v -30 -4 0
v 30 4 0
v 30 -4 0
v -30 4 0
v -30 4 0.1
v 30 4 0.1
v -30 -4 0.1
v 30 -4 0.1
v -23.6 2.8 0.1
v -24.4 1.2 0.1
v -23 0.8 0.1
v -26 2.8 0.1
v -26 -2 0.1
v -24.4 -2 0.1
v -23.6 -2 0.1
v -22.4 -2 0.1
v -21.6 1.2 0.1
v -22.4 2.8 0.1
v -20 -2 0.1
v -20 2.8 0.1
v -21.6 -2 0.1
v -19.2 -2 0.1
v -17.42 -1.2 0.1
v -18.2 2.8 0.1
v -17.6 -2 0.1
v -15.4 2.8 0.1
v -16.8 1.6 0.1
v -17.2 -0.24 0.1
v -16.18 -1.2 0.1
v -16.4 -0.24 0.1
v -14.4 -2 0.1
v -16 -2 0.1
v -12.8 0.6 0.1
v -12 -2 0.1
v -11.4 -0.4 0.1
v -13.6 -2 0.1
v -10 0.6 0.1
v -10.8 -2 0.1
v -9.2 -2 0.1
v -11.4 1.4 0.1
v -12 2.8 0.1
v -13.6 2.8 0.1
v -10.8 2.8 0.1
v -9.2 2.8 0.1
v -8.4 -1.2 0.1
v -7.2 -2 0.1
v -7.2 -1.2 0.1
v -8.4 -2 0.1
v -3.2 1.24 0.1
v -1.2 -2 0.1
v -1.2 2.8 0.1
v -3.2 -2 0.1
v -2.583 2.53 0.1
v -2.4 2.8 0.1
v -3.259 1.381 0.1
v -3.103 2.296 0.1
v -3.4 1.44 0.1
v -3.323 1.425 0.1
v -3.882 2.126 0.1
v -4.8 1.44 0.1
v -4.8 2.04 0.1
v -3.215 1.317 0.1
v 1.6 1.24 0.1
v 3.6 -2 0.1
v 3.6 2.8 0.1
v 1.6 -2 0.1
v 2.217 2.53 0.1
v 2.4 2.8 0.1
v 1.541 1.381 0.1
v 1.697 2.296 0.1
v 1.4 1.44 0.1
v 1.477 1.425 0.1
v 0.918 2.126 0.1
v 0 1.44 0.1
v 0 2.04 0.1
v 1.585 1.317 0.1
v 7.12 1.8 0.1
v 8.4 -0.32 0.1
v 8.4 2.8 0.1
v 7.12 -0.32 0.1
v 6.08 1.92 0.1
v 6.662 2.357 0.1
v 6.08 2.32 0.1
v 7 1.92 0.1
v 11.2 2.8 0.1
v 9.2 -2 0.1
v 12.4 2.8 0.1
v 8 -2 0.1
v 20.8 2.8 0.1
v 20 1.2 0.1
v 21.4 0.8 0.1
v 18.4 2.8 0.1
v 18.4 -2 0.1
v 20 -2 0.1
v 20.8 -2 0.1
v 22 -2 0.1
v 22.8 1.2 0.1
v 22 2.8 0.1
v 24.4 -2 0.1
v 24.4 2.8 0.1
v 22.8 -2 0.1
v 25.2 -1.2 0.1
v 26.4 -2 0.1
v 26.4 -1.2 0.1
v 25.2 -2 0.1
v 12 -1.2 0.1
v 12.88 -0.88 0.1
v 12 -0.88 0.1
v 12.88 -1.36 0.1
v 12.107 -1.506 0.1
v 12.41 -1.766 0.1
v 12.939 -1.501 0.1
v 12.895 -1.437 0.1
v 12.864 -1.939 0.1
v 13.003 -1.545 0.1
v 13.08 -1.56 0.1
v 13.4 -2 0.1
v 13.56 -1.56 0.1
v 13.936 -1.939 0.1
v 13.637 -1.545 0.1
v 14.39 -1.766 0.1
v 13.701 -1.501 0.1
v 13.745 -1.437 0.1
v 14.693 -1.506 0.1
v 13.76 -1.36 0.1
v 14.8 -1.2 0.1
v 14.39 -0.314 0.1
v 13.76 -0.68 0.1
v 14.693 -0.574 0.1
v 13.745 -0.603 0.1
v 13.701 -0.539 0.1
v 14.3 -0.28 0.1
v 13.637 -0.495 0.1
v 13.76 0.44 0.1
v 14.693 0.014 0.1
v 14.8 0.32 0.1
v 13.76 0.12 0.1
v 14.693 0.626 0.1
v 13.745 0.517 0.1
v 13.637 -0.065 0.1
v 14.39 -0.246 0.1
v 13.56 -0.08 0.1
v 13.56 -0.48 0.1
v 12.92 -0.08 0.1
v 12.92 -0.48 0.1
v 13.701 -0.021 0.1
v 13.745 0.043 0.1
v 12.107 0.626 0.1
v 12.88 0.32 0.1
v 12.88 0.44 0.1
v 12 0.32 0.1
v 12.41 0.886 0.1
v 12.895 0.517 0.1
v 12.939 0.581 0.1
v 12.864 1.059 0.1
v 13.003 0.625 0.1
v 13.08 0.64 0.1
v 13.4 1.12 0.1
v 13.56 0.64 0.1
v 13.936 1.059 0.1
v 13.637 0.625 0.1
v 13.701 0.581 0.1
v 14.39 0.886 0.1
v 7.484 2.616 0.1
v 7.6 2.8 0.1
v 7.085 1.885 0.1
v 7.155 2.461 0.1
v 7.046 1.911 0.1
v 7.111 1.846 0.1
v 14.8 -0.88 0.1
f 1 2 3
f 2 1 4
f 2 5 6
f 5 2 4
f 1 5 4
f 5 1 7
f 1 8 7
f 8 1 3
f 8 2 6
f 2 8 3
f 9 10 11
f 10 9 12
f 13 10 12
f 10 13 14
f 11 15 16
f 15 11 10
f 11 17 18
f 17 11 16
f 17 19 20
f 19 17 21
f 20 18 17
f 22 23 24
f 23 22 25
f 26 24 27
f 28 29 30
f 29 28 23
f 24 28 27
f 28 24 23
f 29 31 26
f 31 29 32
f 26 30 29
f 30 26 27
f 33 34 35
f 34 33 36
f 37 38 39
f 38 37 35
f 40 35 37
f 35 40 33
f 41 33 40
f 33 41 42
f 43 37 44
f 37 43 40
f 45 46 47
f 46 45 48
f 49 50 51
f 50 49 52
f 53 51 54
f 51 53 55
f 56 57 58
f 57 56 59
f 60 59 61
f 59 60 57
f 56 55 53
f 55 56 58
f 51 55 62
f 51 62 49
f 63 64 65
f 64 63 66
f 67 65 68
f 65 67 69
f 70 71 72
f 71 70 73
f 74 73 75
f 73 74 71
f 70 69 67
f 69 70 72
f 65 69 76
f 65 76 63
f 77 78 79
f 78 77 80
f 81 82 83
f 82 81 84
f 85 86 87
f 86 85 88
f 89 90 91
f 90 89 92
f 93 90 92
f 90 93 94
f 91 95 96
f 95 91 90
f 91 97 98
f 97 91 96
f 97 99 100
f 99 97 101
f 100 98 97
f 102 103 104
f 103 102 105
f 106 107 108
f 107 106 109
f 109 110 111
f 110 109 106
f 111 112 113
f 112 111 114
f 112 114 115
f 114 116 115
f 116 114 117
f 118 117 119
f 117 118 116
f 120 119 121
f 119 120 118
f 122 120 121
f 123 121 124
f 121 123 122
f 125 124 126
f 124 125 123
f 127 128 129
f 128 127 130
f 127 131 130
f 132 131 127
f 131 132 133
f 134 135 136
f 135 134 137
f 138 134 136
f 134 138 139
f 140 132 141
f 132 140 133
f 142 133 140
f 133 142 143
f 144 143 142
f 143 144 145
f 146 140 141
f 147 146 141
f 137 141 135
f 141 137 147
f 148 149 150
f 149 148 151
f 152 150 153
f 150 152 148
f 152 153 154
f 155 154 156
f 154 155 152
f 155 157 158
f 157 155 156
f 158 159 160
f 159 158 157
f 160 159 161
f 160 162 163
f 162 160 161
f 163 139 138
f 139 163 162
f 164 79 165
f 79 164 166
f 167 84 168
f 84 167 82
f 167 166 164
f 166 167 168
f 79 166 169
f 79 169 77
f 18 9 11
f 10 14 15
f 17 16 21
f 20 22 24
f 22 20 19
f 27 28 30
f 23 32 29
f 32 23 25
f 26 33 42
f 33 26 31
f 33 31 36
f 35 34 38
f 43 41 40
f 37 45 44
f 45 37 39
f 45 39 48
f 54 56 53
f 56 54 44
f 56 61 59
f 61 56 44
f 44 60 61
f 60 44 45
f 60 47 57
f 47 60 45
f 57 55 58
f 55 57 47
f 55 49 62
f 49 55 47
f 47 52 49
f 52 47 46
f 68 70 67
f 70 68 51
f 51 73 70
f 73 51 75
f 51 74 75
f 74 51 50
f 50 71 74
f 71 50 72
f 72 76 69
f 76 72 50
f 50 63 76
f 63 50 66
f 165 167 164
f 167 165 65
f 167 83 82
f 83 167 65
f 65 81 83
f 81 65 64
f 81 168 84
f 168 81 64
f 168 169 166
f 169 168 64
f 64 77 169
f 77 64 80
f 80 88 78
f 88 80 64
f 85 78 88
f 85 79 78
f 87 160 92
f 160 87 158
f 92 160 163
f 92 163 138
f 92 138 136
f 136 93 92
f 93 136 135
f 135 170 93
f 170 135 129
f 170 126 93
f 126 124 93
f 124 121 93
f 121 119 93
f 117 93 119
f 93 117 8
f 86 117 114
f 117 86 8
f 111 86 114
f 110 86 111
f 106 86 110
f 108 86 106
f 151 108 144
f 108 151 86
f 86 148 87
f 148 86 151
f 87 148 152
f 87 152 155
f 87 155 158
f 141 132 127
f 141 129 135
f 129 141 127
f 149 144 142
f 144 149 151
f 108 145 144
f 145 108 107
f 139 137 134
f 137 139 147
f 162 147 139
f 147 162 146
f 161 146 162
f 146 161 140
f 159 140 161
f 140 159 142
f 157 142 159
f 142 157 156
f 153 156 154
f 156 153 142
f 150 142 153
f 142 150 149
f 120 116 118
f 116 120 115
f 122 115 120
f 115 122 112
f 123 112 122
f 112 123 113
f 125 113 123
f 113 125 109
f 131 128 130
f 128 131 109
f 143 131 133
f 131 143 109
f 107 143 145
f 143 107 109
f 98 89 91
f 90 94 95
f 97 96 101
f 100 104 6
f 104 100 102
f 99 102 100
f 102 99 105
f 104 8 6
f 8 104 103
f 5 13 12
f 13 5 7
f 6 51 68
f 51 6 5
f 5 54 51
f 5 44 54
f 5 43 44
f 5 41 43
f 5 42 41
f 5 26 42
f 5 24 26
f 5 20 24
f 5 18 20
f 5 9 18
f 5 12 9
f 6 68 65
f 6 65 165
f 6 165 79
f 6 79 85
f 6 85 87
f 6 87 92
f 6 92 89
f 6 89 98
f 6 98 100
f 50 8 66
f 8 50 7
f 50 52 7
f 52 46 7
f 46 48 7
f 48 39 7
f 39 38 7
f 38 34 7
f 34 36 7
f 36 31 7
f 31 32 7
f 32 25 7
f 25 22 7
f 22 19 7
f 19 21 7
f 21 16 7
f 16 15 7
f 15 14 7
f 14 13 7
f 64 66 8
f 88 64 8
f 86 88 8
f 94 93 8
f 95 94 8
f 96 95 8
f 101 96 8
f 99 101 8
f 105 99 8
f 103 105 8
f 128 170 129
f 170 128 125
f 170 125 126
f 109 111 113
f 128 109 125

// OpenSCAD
// file: ../p/box5-12.scad
use <../lib.scad>
function ldraw_lib__box5_12() = [
// 0 Box with 5 Faces without Any Edges
// 0 Name: box5-12.dat
// 0 Author: Chris Dee [cwdee]
// 0 !LDRAW_ORG Primitive UPDATE 2009-02
// 0 !LICENSE Licensed under CC BY 4.0 : see CAreadme.txt
// 
// 0 BFC CERTIFY CCW
  [0,"BFC","CERTIFY"],
  [0,"BFC","CCW"],
// 
// 0 !HISTORY 2009-09-03 [PTadmin] Official Update 2009-02
// 
// 
// 4 16 1 1 1 1 1 -1 -1 1 -1 -1 1 1
  [4,16,1,1,1,1,1,-1,-1,1,-1,-1,1,1],
// 4 16 -1 0 1 1 0 1 1 1 1 -1 1 1
  [4,16,-1,0,1,1,0,1,1,1,1,-1,1,1],
// 4 16 -1 0 -1 -1 0 1 -1 1 1 -1 1 -1
  [4,16,-1,0,-1,-1,0,1,-1,1,1,-1,1,-1],
// 4 16 1 0 -1 -1 0 -1 -1 1 -1 1 1 -1
  [4,16,1,0,-1,-1,0,-1,-1,1,-1,1,1,-1],
// 4 16 1 0 1 1 0 -1 1 1 -1 1 1 1
  [4,16,1,0,1,1,0,-1,1,1,-1,1,1,1],
// 0
];
module ldraw_lib__box5_12(step=0, col=false, unit=2/5, alt=false, line=0.2, solid=!$preview)
    makepoly(ldraw_lib__box5_12(), step=step, col=col, unit=unit, alt=alt, line=line, solid=solid);
ldraw_lib__box5_12(line=0.2);
// main file
use <../lib.scad>
use <../p/box5-12.scad>
function ldraw_lib__4198678a() = [
// 0 Sticker  1.0 x  7.5 with Black "MAX. 11  1/3 M."
// 0 Name: 4198678a.dat
// 0 Author: Tim Lampmann [L4mpi]
// 0 !LDRAW_ORG Part UPDATE 2019-03
// 0 !LICENSE Licensed under CC BY 4.0 : see CAreadme.txt
// 
// 0 BFC CERTIFY CCW
  [0,"BFC","CERTIFY"],
  [0,"BFC","CCW"],
// 
// 0 !KEYWORDS Cargo, container, Crane, Freight yard, Lorry, Set 4514
// 
// 0 !HISTORY 2019-12-27 [PTadmin] Official Update 2019-03
// 
// 
// 1 16 0 -0.25 0 75 0 0 0 0.25 0 0 0 10 box5-12.dat
  [1,16,0,-0.25,0,75,0,0,0,0.25,0,0,0,10, ldraw_lib__box5_12()],
// 4 0 -59 -0.25 7 -65 -0.25 7 -61 -0.25 3 -57.5 -0.25 2
  [4,0,-59,-0.25,7,-65,-0.25,7,-61,-0.25,3,-57.5,-0.25,2],
// 4 0 -61 -0.25 3 -65 -0.25 7 -65 -0.25 -5 -61 -0.25 -5
  [4,0,-61,-0.25,3,-65,-0.25,7,-65,-0.25,-5,-61,-0.25,-5],
// 4 0 -59 -0.25 -5 -56 -0.25 -5 -57.5 -0.25 2 -61 -0.25 3
  [4,0,-59,-0.25,-5,-56,-0.25,-5,-57.5,-0.25,2,-61,-0.25,3],
// 4 0 -54 -0.25 3 -56 -0.25 7 -57.5 -0.25 2 -56 -0.25 -5
  [4,0,-54,-0.25,3,-56,-0.25,7,-57.5,-0.25,2,-56,-0.25,-5],
// 4 0 -54 -0.25 3 -54 -0.25 -5 -50 -0.25 -5 -50 -0.25 7
  [4,0,-54,-0.25,3,-54,-0.25,-5,-50,-0.25,-5,-50,-0.25,7],
// 3 0 -50 -0.25 7 -56 -0.25 7 -54 -0.25 3
  [3,0,-50,-0.25,7,-56,-0.25,7,-54,-0.25,3],
// 4 0 -45.5 -0.25 7 -48 -0.25 -5 -44 -0.25 -5 -43.55 -0.25 -3
  [4,0,-45.5,-0.25,7,-48,-0.25,-5,-44,-0.25,-5,-43.55,-0.25,-3],
// 3 0 -38.5 -0.25 7 -45.5 -0.25 7 -42 -0.25 4
  [3,0,-38.5,-0.25,7,-45.5,-0.25,7,-42,-0.25,4],
// 4 0 -41 -0.25 -0.6 -43 -0.25 -0.6 -43.55 -0.25 -3 -40.45 -0.25 -3
  [4,0,-41,-0.25,-0.6,-43,-0.25,-0.6,-43.55,-0.25,-3,-40.45,-0.25,-3],
// 4 0 -43 -0.25 -0.6 -42 -0.25 4 -45.5 -0.25 7 -43.55 -0.25 -3
  [4,0,-43,-0.25,-0.6,-42,-0.25,4,-45.5,-0.25,7,-43.55,-0.25,-3],
// 4 0 -40 -0.25 -5 -36 -0.25 -5 -38.5 -0.25 7 -40.45 -0.25 -3
  [4,0,-40,-0.25,-5,-36,-0.25,-5,-38.5,-0.25,7,-40.45,-0.25,-3],
// 4 0 -41 -0.25 -0.6 -40.45 -0.25 -3 -38.5 -0.25 7 -42 -0.25 4
  [4,0,-41,-0.25,-0.6,-40.45,-0.25,-3,-38.5,-0.25,7,-42,-0.25,4],
// 4 0 -34 -0.25 -5 -30 -0.25 -5 -28.5 -0.25 -1 -32 -0.25 1.5
  [4,0,-34,-0.25,-5,-30,-0.25,-5,-28.5,-0.25,-1,-32,-0.25,1.5],
// 4 0 -28.5 -0.25 -1 -27 -0.25 -5 -23 -0.25 -5 -25 -0.25 1.5
  [4,0,-28.5,-0.25,-1,-27,-0.25,-5,-23,-0.25,-5,-25,-0.25,1.5],
// 4 0 -32 -0.25 1.5 -28.5 -0.25 -1 -25 -0.25 1.5 -28.5 -0.25 3.5
  [4,0,-32,-0.25,1.5,-28.5,-0.25,-1,-25,-0.25,1.5,-28.5,-0.25,3.5],
// 4 0 -30 -0.25 7 -34 -0.25 7 -32 -0.25 1.5 -28.5 -0.25 3.5
  [4,0,-30,-0.25,7,-34,-0.25,7,-32,-0.25,1.5,-28.5,-0.25,3.5],
// 4 0 -27 -0.25 7 -28.5 -0.25 3.5 -25 -0.25 1.5 -23 -0.25 7
  [4,0,-27,-0.25,7,-28.5,-0.25,3.5,-25,-0.25,1.5,-23,-0.25,7],
// 4 0 -18 -0.25 -3 -21 -0.25 -3 -21 -0.25 -5 -18 -0.25 -5
  [4,0,-18,-0.25,-3,-21,-0.25,-3,-21,-0.25,-5,-18,-0.25,-5],
// 4 0 -8 -0.25 -5 -3 -0.25 -5 -3 -0.25 7 -8 -0.25 3.1
  [4,0,-8,-0.25,-5,-3,-0.25,-5,-3,-0.25,7,-8,-0.25,3.1],
// 4 0 -3 -0.25 7 -6 -0.25 7 -6.45765 -0.25 6.32597 -8.14645 -0.25 3.45355
  [4,0,-3,-0.25,7,-6,-0.25,7,-6.45765,-0.25,6.32597,-8.14645,-0.25,3.45355],
// 4 0 -7.75807 -0.25 5.73934 -9.70428 -0.25 5.31418 -8.5 -0.25 3.6 -8.30866 -0.25 3.56194
  [4,0,-7.75807,-0.25,5.73934,-9.70428,-0.25,5.31418,-8.5,-0.25,3.6,-8.30866,-0.25,3.56194],
// 4 0 -8.5 -0.25 3.6 -9.70428 -0.25 5.31418 -12 -0.25 5.1 -12 -0.25 3.6
  [4,0,-8.5,-0.25,3.6,-9.70428,-0.25,5.31418,-12,-0.25,5.1,-12,-0.25,3.6],
// 4 0 -7.75807 -0.25 5.73934 -8.30866 -0.25 3.56194 -8.14645 -0.25 3.45355 -6.45765 -0.25 6.32597
  [4,0,-7.75807,-0.25,5.73934,-8.30866,-0.25,3.56194,-8.14645,-0.25,3.45355,-6.45765,-0.25,6.32597],
// 3 0 -3 -0.25 7 -8.14645 -0.25 3.45355 -8.03806 -0.25 3.29134
  [3,0,-3,-0.25,7,-8.14645,-0.25,3.45355,-8.03806,-0.25,3.29134],
// 3 0 -3 -0.25 7 -8.03806 -0.25 3.29134 -8 -0.25 3.1
  [3,0,-3,-0.25,7,-8.03806,-0.25,3.29134,-8,-0.25,3.1],
// 4 0 4 -0.25 -5 9 -0.25 -5 9 -0.25 7 4 -0.25 3.1
  [4,0,4,-0.25,-5,9,-0.25,-5,9,-0.25,7,4,-0.25,3.1],
// 4 0 9 -0.25 7 6 -0.25 7 5.54235 -0.25 6.32597 3.85355 -0.25 3.45355
  [4,0,9,-0.25,7,6,-0.25,7,5.54235,-0.25,6.32597,3.85355,-0.25,3.45355],
// 4 0 4.24193 -0.25 5.73934 2.29572 -0.25 5.31418 3.5 -0.25 3.6 3.69134 -0.25 3.56194
  [4,0,4.24193,-0.25,5.73934,2.29572,-0.25,5.31418,3.5,-0.25,3.6,3.69134,-0.25,3.56194],
// 4 0 3.5 -0.25 3.6 2.29572 -0.25 5.31418 0 -0.25 5.1 0 -0.25 3.6
  [4,0,3.5,-0.25,3.6,2.29572,-0.25,5.31418,0,-0.25,5.1,0,-0.25,3.6],
// 4 0 4.24193 -0.25 5.73934 3.69134 -0.25 3.56194 3.85355 -0.25 3.45355 5.54235 -0.25 6.32597
  [4,0,4.24193,-0.25,5.73934,3.69134,-0.25,3.56194,3.85355,-0.25,3.45355,5.54235,-0.25,6.32597],
// 3 0 9 -0.25 7 3.85355 -0.25 3.45355 3.96194 -0.25 3.29134
  [3,0,9,-0.25,7,3.85355,-0.25,3.45355,3.96194,-0.25,3.29134],
// 3 0 9 -0.25 7 3.96194 -0.25 3.29134 4 -0.25 3.1
  [3,0,9,-0.25,7,3.96194,-0.25,3.29134,4,-0.25,3.1],
// 4 0 17.8 -0.25 -0.8 21 -0.25 -0.8 21 -0.25 7 17.8 -0.25 4.5
  [4,0,17.8,-0.25,-0.8,21,-0.25,-0.8,21,-0.25,7,17.8,-0.25,4.5],
// 4 0 15.2 -0.25 5.8 15.2 -0.25 4.8 17.5 -0.25 4.8 16.6542 -0.25 5.89134
  [4,0,15.2,-0.25,5.8,15.2,-0.25,4.8,17.5,-0.25,4.8,16.6542,-0.25,5.89134],
// 4 0 20 -0.25 -5 23 -0.25 -5 31 -0.25 7 28 -0.25 7
  [4,0,20,-0.25,-5,23,-0.25,-5,31,-0.25,7,28,-0.25,7],
// 4 0 52 -0.25 7 46 -0.25 7 50 -0.25 3 53.5 -0.25 2
  [4,0,52,-0.25,7,46,-0.25,7,50,-0.25,3,53.5,-0.25,2],
// 4 0 50 -0.25 3 46 -0.25 7 46 -0.25 -5 50 -0.25 -5
  [4,0,50,-0.25,3,46,-0.25,7,46,-0.25,-5,50,-0.25,-5],
// 4 0 52 -0.25 -5 55 -0.25 -5 53.5 -0.25 2 50 -0.25 3
  [4,0,52,-0.25,-5,55,-0.25,-5,53.5,-0.25,2,50,-0.25,3],
// 4 0 57 -0.25 3 55 -0.25 7 53.5 -0.25 2 55 -0.25 -5
  [4,0,57,-0.25,3,55,-0.25,7,53.5,-0.25,2,55,-0.25,-5],
// 4 0 57 -0.25 3 57 -0.25 -5 61 -0.25 -5 61 -0.25 7
  [4,0,57,-0.25,3,57,-0.25,-5,61,-0.25,-5,61,-0.25,7],
// 3 0 61 -0.25 7 55 -0.25 7 57 -0.25 3
  [3,0,61,-0.25,7,55,-0.25,7,57,-0.25,3],
// 4 0 66 -0.25 -3 63 -0.25 -3 63 -0.25 -5 66 -0.25 -5
  [4,0,66,-0.25,-3,63,-0.25,-3,63,-0.25,-5,66,-0.25,-5],
// 4 0 32.2 -0.25 -2.2 30 -0.25 -2.2 30 -0.25 -3 32.2 -0.25 -3.4
  [4,0,32.2,-0.25,-2.2,30,-0.25,-2.2,30,-0.25,-3,32.2,-0.25,-3.4],
// 4 0 32.2 -0.25 -3.4 30 -0.25 -3 30.26642 -0.25 -3.76537 31.02513 -0.25 -4.41421
  [4,0,32.2,-0.25,-3.4,30,-0.25,-3,30.26642,-0.25,-3.76537,31.02513,-0.25,-4.41421],
// 4 0 32.23806 -0.25 -3.59134 31.02513 -0.25 -4.41421 32.16061 -0.25 -4.84776 32.34645 -0.25 -3.75355
  [4,0,32.23806,-0.25,-3.59134,31.02513,-0.25,-4.41421,32.16061,-0.25,-4.84776,32.34645,-0.25,-3.75355],
// 3 0 32.34645 -0.25 -3.75355 32.16061 -0.25 -4.84776 32.50866 -0.25 -3.86194
  [3,0,32.34645,-0.25,-3.75355,32.16061,-0.25,-4.84776,32.50866,-0.25,-3.86194],
// 4 0 32.7 -0.25 -3.9 32.50866 -0.25 -3.86194 32.16061 -0.25 -4.84776 33.5 -0.25 -5
  [4,0,32.7,-0.25,-3.9,32.50866,-0.25,-3.86194,32.16061,-0.25,-4.84776,33.5,-0.25,-5],
// 4 0 33.9 -0.25 -3.9 32.7 -0.25 -3.9 33.5 -0.25 -5 34.83939 -0.25 -4.84776
  [4,0,33.9,-0.25,-3.9,32.7,-0.25,-3.9,33.5,-0.25,-5,34.83939,-0.25,-4.84776],
// 4 0 34.09134 -0.25 -3.86194 33.9 -0.25 -3.9 34.83939 -0.25 -4.84776 35.97487 -0.25 -4.41421
  [4,0,34.09134,-0.25,-3.86194,33.9,-0.25,-3.9,34.83939,-0.25,-4.84776,35.97487,-0.25,-4.41421],
// 3 0 34.25355 -0.25 -3.75355 34.09134 -0.25 -3.86194 35.97487 -0.25 -4.41421
  [3,0,34.25355,-0.25,-3.75355,34.09134,-0.25,-3.86194,35.97487,-0.25,-4.41421],
// 4 0 34.36194 -0.25 -3.59134 34.25355 -0.25 -3.75355 35.97487 -0.25 -4.41421 36.73358 -0.25 -3.76537
  [4,0,34.36194,-0.25,-3.59134,34.25355,-0.25,-3.75355,35.97487,-0.25,-4.41421,36.73358,-0.25,-3.76537],
// 4 0 34.4 -0.25 -3.4 34.36194 -0.25 -3.59134 36.73358 -0.25 -3.76537 37 -0.25 -3
  [4,0,34.4,-0.25,-3.4,34.36194,-0.25,-3.59134,36.73358,-0.25,-3.76537,37,-0.25,-3],
// 4 0 34.4 -0.25 -1.7 36.73358 -0.25 -1.43463 35.97487 -0.25 -0.78579 34.36194 -0.25 -1.50866
  [4,0,34.4,-0.25,-1.7,36.73358,-0.25,-1.43463,35.97487,-0.25,-0.78579,34.36194,-0.25,-1.50866],
// 3 0 35.97487 -0.25 -0.78579 34.25355 -0.25 -1.34645 34.36194 -0.25 -1.50866
  [3,0,35.97487,-0.25,-0.78579,34.25355,-0.25,-1.34645,34.36194,-0.25,-1.50866],
// 4 0 34.09134 -0.25 -1.23806 34.25355 -0.25 -1.34645 35.97487 -0.25 -0.78579 35.75 -0.25 -0.7
  [4,0,34.09134,-0.25,-1.23806,34.25355,-0.25,-1.34645,35.97487,-0.25,-0.78579,35.75,-0.25,-0.7],
// 4 0 34.4 -0.25 0.3 36.73358 -0.25 0.03463 37 -0.25 0.8 34.4 -0.25 1.1
  [4,0,34.4,-0.25,0.3,36.73358,-0.25,0.03463,37,-0.25,0.8,34.4,-0.25,1.1],
// 4 0 34.4 -0.25 1.1 37 -0.25 0.8 36.73358 -0.25 1.56537 34.36194 -0.25 1.29134
  [4,0,34.4,-0.25,1.1,37,-0.25,0.8,36.73358,-0.25,1.56537,34.36194,-0.25,1.29134],
// 4 0 35.75 -0.25 -0.7 35.97487 -0.25 -0.61421 34.09134 -0.25 -0.16194 34.09134 -0.25 -1.23806
  [4,0,35.75,-0.25,-0.7,35.97487,-0.25,-0.61421,34.09134,-0.25,-0.16194,34.09134,-0.25,-1.23806],
// 4 0 33.9 -0.25 -1.2 34.09134 -0.25 -1.23806 34.09134 -0.25 -0.16194 33.9 -0.25 -0.2
  [4,0,33.9,-0.25,-1.2,34.09134,-0.25,-1.23806,34.09134,-0.25,-0.16194,33.9,-0.25,-0.2],
// 4 0 32.3 -0.25 -1.2 33.9 -0.25 -1.2 33.9 -0.25 -0.2 32.3 -0.25 -0.2
  [4,0,32.3,-0.25,-1.2,33.9,-0.25,-1.2,33.9,-0.25,-0.2,32.3,-0.25,-0.2],
// 3 0 34.25355 -0.25 -0.05355 34.09134 -0.25 -0.16194 35.97487 -0.25 -0.61421
  [3,0,34.25355,-0.25,-0.05355,34.09134,-0.25,-0.16194,35.97487,-0.25,-0.61421],
// 3 0 34.36194 -0.25 0.10866 34.25355 -0.25 -0.05355 35.97487 -0.25 -0.61421
  [3,0,34.36194,-0.25,0.10866,34.25355,-0.25,-0.05355,35.97487,-0.25,-0.61421],
// 4 0 34.4 -0.25 0.3 34.36194 -0.25 0.10866 35.97487 -0.25 -0.61421 36.73358 -0.25 0.03463
  [4,0,34.4,-0.25,0.3,34.36194,-0.25,0.10866,35.97487,-0.25,-0.61421,36.73358,-0.25,0.03463],
// 4 0 30 -0.25 0.8 32.2 -0.25 0.8 32.2 -0.25 1.1 30.26642 -0.25 1.56537
  [4,0,30,-0.25,0.8,32.2,-0.25,0.8,32.2,-0.25,1.1,30.26642,-0.25,1.56537],
// 4 0 30.26642 -0.25 1.56537 32.2 -0.25 1.1 32.23806 -0.25 1.29134 31.02513 -0.25 2.21421
  [4,0,30.26642,-0.25,1.56537,32.2,-0.25,1.1,32.23806,-0.25,1.29134,31.02513,-0.25,2.21421],
// 3 0 31.02513 -0.25 2.21421 32.23806 -0.25 1.29134 32.34645 -0.25 1.45355
  [3,0,31.02513,-0.25,2.21421,32.23806,-0.25,1.29134,32.34645,-0.25,1.45355],
// 4 0 31.02513 -0.25 2.21421 32.34645 -0.25 1.45355 32.50866 -0.25 1.56194 32.16061 -0.25 2.64776
  [4,0,31.02513,-0.25,2.21421,32.34645,-0.25,1.45355,32.50866,-0.25,1.56194,32.16061,-0.25,2.64776],
// 4 0 32.16061 -0.25 2.64776 32.50866 -0.25 1.56194 32.7 -0.25 1.6 33.5 -0.25 2.8
  [4,0,32.16061,-0.25,2.64776,32.50866,-0.25,1.56194,32.7,-0.25,1.6,33.5,-0.25,2.8],
// 4 0 33.5 -0.25 2.8 32.7 -0.25 1.6 33.9 -0.25 1.6 34.83939 -0.25 2.64776
  [4,0,33.5,-0.25,2.8,32.7,-0.25,1.6,33.9,-0.25,1.6,34.83939,-0.25,2.64776],
// 3 0 34.83939 -0.25 2.64776 33.9 -0.25 1.6 34.09134 -0.25 1.56194
  [3,0,34.83939,-0.25,2.64776,33.9,-0.25,1.6,34.09134,-0.25,1.56194],
// 4 0 34.83939 -0.25 2.64776 34.09134 -0.25 1.56194 34.25355 -0.25 1.45355 35.97487 -0.25 2.21421
  [4,0,34.83939,-0.25,2.64776,34.09134,-0.25,1.56194,34.25355,-0.25,1.45355,35.97487,-0.25,2.21421],
// 4 0 35.97487 -0.25 2.21421 34.25355 -0.25 1.45355 34.36194 -0.25 1.29134 36.73358 -0.25 1.56537
  [4,0,35.97487,-0.25,2.21421,34.25355,-0.25,1.45355,34.36194,-0.25,1.29134,36.73358,-0.25,1.56537],
// 4 0 21 -0.25 7 19 -0.25 7 18.71074 -0.25 6.54078 17.71213 -0.25 4.71213
  [4,0,21,-0.25,7,19,-0.25,7,18.71074,-0.25,6.54078,17.71213,-0.25,4.71213],
// 4 0 17.88701 -0.25 6.15147 16.6542 -0.25 5.89134 17.5 -0.25 4.8 17.61481 -0.25 4.77716
  [4,0,17.88701,-0.25,6.15147,16.6542,-0.25,5.89134,17.5,-0.25,4.8,17.61481,-0.25,4.77716],
// 4 0 17.88701 -0.25 6.15147 17.61481 -0.25 4.77716 17.71213 -0.25 4.71213 18.71074 -0.25 6.54078
  [4,0,17.88701,-0.25,6.15147,17.61481,-0.25,4.77716,17.71213,-0.25,4.71213,18.71074,-0.25,6.54078],
// 3 0 21 -0.25 7 17.71213 -0.25 4.71213 17.77716 -0.25 4.61481
  [3,0,21,-0.25,7,17.71213,-0.25,4.71213,17.77716,-0.25,4.61481],
// 3 0 21 -0.25 7 17.77716 -0.25 4.61481 17.8 -0.25 4.5
  [3,0,21,-0.25,7,17.77716,-0.25,4.61481,17.8,-0.25,4.5],
// 3 16 -56 -0.25 7 -59 -0.25 7 -57.5 -0.25 2
  [3,16,-56,-0.25,7,-59,-0.25,7,-57.5,-0.25,2],
// 3 16 -61 -0.25 3 -61 -0.25 -5 -59 -0.25 -5
  [3,16,-61,-0.25,3,-61,-0.25,-5,-59,-0.25,-5],
// 3 16 -54 -0.25 3 -56 -0.25 -5 -54 -0.25 -5
  [3,16,-54,-0.25,3,-56,-0.25,-5,-54,-0.25,-5],
// 4 16 -50 -0.25 7 -50 -0.25 -5 -48 -0.25 -5 -45.5 -0.25 7
  [4,16,-50,-0.25,7,-50,-0.25,-5,-48,-0.25,-5,-45.5,-0.25,7],
// 3 16 -42 -0.25 4 -43 -0.25 -0.6 -41 -0.25 -0.6
  [3,16,-42,-0.25,4,-43,-0.25,-0.6,-41,-0.25,-0.6],
// 4 16 -43.55 -0.25 -3 -44 -0.25 -5 -40 -0.25 -5 -40.45 -0.25 -3
  [4,16,-43.55,-0.25,-3,-44,-0.25,-5,-40,-0.25,-5,-40.45,-0.25,-3],
// 4 16 -32 -0.25 1.5 -34 -0.25 7 -38.5 -0.25 7 -36 -0.25 -5
  [4,16,-32,-0.25,1.5,-34,-0.25,7,-38.5,-0.25,7,-36,-0.25,-5],
// 3 16 -32 -0.25 1.5 -36 -0.25 -5 -34 -0.25 -5
  [3,16,-32,-0.25,1.5,-36,-0.25,-5,-34,-0.25,-5],
// 3 16 -28.5 -0.25 -1 -30 -0.25 -5 -27 -0.25 -5
  [3,16,-28.5,-0.25,-1,-30,-0.25,-5,-27,-0.25,-5],
// 3 16 -27 -0.25 7 -30 -0.25 7 -28.5 -0.25 3.5
  [3,16,-27,-0.25,7,-30,-0.25,7,-28.5,-0.25,3.5],
// 4 16 -21 -0.25 -3 -23 -0.25 7 -25 -0.25 1.5 -23 -0.25 -5
  [4,16,-21,-0.25,-3,-23,-0.25,7,-25,-0.25,1.5,-23,-0.25,-5],
// 3 16 -21 -0.25 -3 -23 -0.25 -5 -21 -0.25 -5
  [3,16,-21,-0.25,-3,-23,-0.25,-5,-21,-0.25,-5],
// 4 16 -6.45765 -0.25 6.32597 -6 -0.25 7 -23 -0.25 7 -7.75807 -0.25 5.73934
  [4,16,-6.45765,-0.25,6.32597,-6,-0.25,7,-23,-0.25,7,-7.75807,-0.25,5.73934],
// 4 16 -9.70428 -0.25 5.31418 -7.75807 -0.25 5.73934 -23 -0.25 7 -12 -0.25 5.1
  [4,16,-9.70428,-0.25,5.31418,-7.75807,-0.25,5.73934,-23,-0.25,7,-12,-0.25,5.1],
// 4 16 -12 -0.25 3.6 -12 -0.25 5.1 -23 -0.25 7 -21 -0.25 -3
  [4,16,-12,-0.25,3.6,-12,-0.25,5.1,-23,-0.25,7,-21,-0.25,-3],
// 4 16 -12 -0.25 3.6 -21 -0.25 -3 -18 -0.25 -3 -8.5 -0.25 3.6
  [4,16,-12,-0.25,3.6,-21,-0.25,-3,-18,-0.25,-3,-8.5,-0.25,3.6],
// 4 16 -8.30866 -0.25 3.56194 -8.5 -0.25 3.6 -18 -0.25 -3 -8.14645 -0.25 3.45355
  [4,16,-8.30866,-0.25,3.56194,-8.5,-0.25,3.6,-18,-0.25,-3,-8.14645,-0.25,3.45355],
// 4 16 -8.03806 -0.25 3.29134 -8.14645 -0.25 3.45355 -18 -0.25 -3 -8 -0.25 3.1
  [4,16,-8.03806,-0.25,3.29134,-8.14645,-0.25,3.45355,-18,-0.25,-3,-8,-0.25,3.1],
// 4 16 -8 -0.25 -5 -8 -0.25 3.1 -18 -0.25 -3 -18 -0.25 -5
  [4,16,-8,-0.25,-5,-8,-0.25,3.1,-18,-0.25,-3,-18,-0.25,-5],
// 4 16 5.54235 -0.25 6.32597 6 -0.25 7 -3 -0.25 7 4.24193 -0.25 5.73934
  [4,16,5.54235,-0.25,6.32597,6,-0.25,7,-3,-0.25,7,4.24193,-0.25,5.73934],
// 4 16 2.29572 -0.25 5.31418 4.24193 -0.25 5.73934 -3 -0.25 7 0 -0.25 5.1
  [4,16,2.29572,-0.25,5.31418,4.24193,-0.25,5.73934,-3,-0.25,7,0,-0.25,5.1],
// 4 16 0 -0.25 3.6 0 -0.25 5.1 -3 -0.25 7 -3 -0.25 -5
  [4,16,0,-0.25,3.6,0,-0.25,5.1,-3,-0.25,7,-3,-0.25,-5],
// 4 16 3.5 -0.25 3.6 0 -0.25 3.6 -3 -0.25 -5 3.69134 -0.25 3.56194
  [4,16,3.5,-0.25,3.6,0,-0.25,3.6,-3,-0.25,-5,3.69134,-0.25,3.56194],
// 4 16 3.85355 -0.25 3.45355 3.69134 -0.25 3.56194 -3 -0.25 -5 3.96194 -0.25 3.29134
  [4,16,3.85355,-0.25,3.45355,3.69134,-0.25,3.56194,-3,-0.25,-5,3.96194,-0.25,3.29134],
// 4 16 4 -0.25 3.1 3.96194 -0.25 3.29134 -3 -0.25 -5 4 -0.25 -5
  [4,16,4,-0.25,3.1,3.96194,-0.25,3.29134,-3,-0.25,-5,4,-0.25,-5],
// 4 16 18.71074 -0.25 6.54078 19 -0.25 7 9 -0.25 7 17.88701 -0.25 6.15147
  [4,16,18.71074,-0.25,6.54078,19,-0.25,7,9,-0.25,7,17.88701,-0.25,6.15147],
// 4 16 16.6542 -0.25 5.89134 17.88701 -0.25 6.15147 9 -0.25 7 15.2 -0.25 5.8
  [4,16,16.6542,-0.25,5.89134,17.88701,-0.25,6.15147,9,-0.25,7,15.2,-0.25,5.8],
// 4 16 15.2 -0.25 4.8 15.2 -0.25 5.8 9 -0.25 7 9 -0.25 -5
  [4,16,15.2,-0.25,4.8,15.2,-0.25,5.8,9,-0.25,7,9,-0.25,-5],
// 4 16 17.5 -0.25 4.8 15.2 -0.25 4.8 9 -0.25 -5 17.61481 -0.25 4.77716
  [4,16,17.5,-0.25,4.8,15.2,-0.25,4.8,9,-0.25,-5,17.61481,-0.25,4.77716],
// 4 16 17.71213 -0.25 4.71213 17.61481 -0.25 4.77716 9 -0.25 -5 17.77716 -0.25 4.61481
  [4,16,17.71213,-0.25,4.71213,17.61481,-0.25,4.77716,9,-0.25,-5,17.77716,-0.25,4.61481],
// 4 16 17.8 -0.25 4.5 17.77716 -0.25 4.61481 9 -0.25 -5 17.8 -0.25 -0.8
  [4,16,17.8,-0.25,4.5,17.77716,-0.25,4.61481,9,-0.25,-5,17.8,-0.25,-0.8],
// 4 16 17.8 -0.25 -0.8 9 -0.25 -5 20 -0.25 -5 21 -0.25 -0.8
  [4,16,17.8,-0.25,-0.8,9,-0.25,-5,20,-0.25,-5,21,-0.25,-0.8],
// 3 16 28 -0.25 7 21 -0.25 -0.8 20 -0.25 -5
  [3,16,28,-0.25,7,21,-0.25,-0.8,20,-0.25,-5],
// 3 16 28 -0.25 7 21 -0.25 7 21 -0.25 -0.8
  [3,16,28,-0.25,7,21,-0.25,7,21,-0.25,-0.8],
// 4 16 31 -0.25 7 33.5 -0.25 2.8 34.83939 -0.25 2.64776 46 -0.25 7
  [4,16,31,-0.25,7,33.5,-0.25,2.8,34.83939,-0.25,2.64776,46,-0.25,7],
// 3 16 46 -0.25 7 34.83939 -0.25 2.64776 35.97487 -0.25 2.21421
  [3,16,46,-0.25,7,34.83939,-0.25,2.64776,35.97487,-0.25,2.21421],
// 3 16 46 -0.25 7 35.97487 -0.25 2.21421 36.73358 -0.25 1.56537
  [3,16,46,-0.25,7,35.97487,-0.25,2.21421,36.73358,-0.25,1.56537],
// 3 16 46 -0.25 7 36.73358 -0.25 1.56537 37 -0.25 0.8
  [3,16,46,-0.25,7,36.73358,-0.25,1.56537,37,-0.25,0.8],
// 4 16 46 -0.25 7 37 -0.25 0.8 36.73358 -0.25 0.03463 46 -0.25 -5
  [4,16,46,-0.25,7,37,-0.25,0.8,36.73358,-0.25,0.03463,46,-0.25,-5],
// 4 16 46 -0.25 -5 36.73358 -0.25 0.03463 36.73358 -0.25 -1.43463 37 -0.25 -2.2
  [4,16,46,-0.25,-5,36.73358,-0.25,0.03463,36.73358,-0.25,-1.43463,37,-0.25,-2.2],
// 3 16 37 -0.25 -2.2 37 -0.25 -3 46 -0.25 -5
  [3,16,37,-0.25,-2.2,37,-0.25,-3,46,-0.25,-5],
// 3 16 37 -0.25 -3 36.73358 -0.25 -3.76537 46 -0.25 -5
  [3,16,37,-0.25,-3,36.73358,-0.25,-3.76537,46,-0.25,-5],
// 3 16 36.73358 -0.25 -3.76537 35.97487 -0.25 -4.41421 46 -0.25 -5
  [3,16,36.73358,-0.25,-3.76537,35.97487,-0.25,-4.41421,46,-0.25,-5],
// 3 16 35.97487 -0.25 -4.41421 34.83939 -0.25 -4.84776 46 -0.25 -5
  [3,16,35.97487,-0.25,-4.41421,34.83939,-0.25,-4.84776,46,-0.25,-5],
// 4 16 46 -0.25 -5 34.83939 -0.25 -4.84776 33.5 -0.25 -5 75 -0.25 -10
  [4,16,46,-0.25,-5,34.83939,-0.25,-4.84776,33.5,-0.25,-5,75,-0.25,-10],
// 4 16 33.5 -0.25 -5 32.16061 -0.25 -4.84776 23 -0.25 -5 75 -0.25 -10
  [4,16,33.5,-0.25,-5,32.16061,-0.25,-4.84776,23,-0.25,-5,75,-0.25,-10],
// 3 16 31.02513 -0.25 -4.41421 23 -0.25 -5 32.16061 -0.25 -4.84776
  [3,16,31.02513,-0.25,-4.41421,23,-0.25,-5,32.16061,-0.25,-4.84776],
// 3 16 30.26642 -0.25 -3.76537 23 -0.25 -5 31.02513 -0.25 -4.41421
  [3,16,30.26642,-0.25,-3.76537,23,-0.25,-5,31.02513,-0.25,-4.41421],
// 3 16 30 -0.25 -3 23 -0.25 -5 30.26642 -0.25 -3.76537
  [3,16,30,-0.25,-3,23,-0.25,-5,30.26642,-0.25,-3.76537],
// 3 16 30 -0.25 -2.2 23 -0.25 -5 30 -0.25 -3
  [3,16,30,-0.25,-2.2,23,-0.25,-5,30,-0.25,-3],
// 4 16 30 -0.25 0.8 23 -0.25 -5 30 -0.25 -2.2 32.3 -0.25 -0.2
  [4,16,30,-0.25,0.8,23,-0.25,-5,30,-0.25,-2.2,32.3,-0.25,-0.2],
// 4 16 31 -0.25 7 23 -0.25 -5 30 -0.25 0.8 30.26642 -0.25 1.56537
  [4,16,31,-0.25,7,23,-0.25,-5,30,-0.25,0.8,30.26642,-0.25,1.56537],
// 3 16 31 -0.25 7 30.26642 -0.25 1.56537 31.02513 -0.25 2.21421
  [3,16,31,-0.25,7,30.26642,-0.25,1.56537,31.02513,-0.25,2.21421],
// 3 16 31 -0.25 7 31.02513 -0.25 2.21421 32.16061 -0.25 2.64776
  [3,16,31,-0.25,7,31.02513,-0.25,2.21421,32.16061,-0.25,2.64776],
// 3 16 31 -0.25 7 32.16061 -0.25 2.64776 33.5 -0.25 2.8
  [3,16,31,-0.25,7,32.16061,-0.25,2.64776,33.5,-0.25,2.8],
// 3 16 35.97487 -0.25 -0.61421 35.75 -0.25 -0.7 35.97487 -0.25 -0.78579
  [3,16,35.97487,-0.25,-0.61421,35.75,-0.25,-0.7,35.97487,-0.25,-0.78579],
// 4 16 36.73358 -0.25 0.03463 35.97487 -0.25 -0.61421 35.97487 -0.25 -0.78579 36.73358 -0.25 -1.43463
  [4,16,36.73358,-0.25,0.03463,35.97487,-0.25,-0.61421,35.97487,-0.25,-0.78579,36.73358,-0.25,-1.43463],
// 4 16 32.2 -0.25 0.8 30 -0.25 0.8 32.3 -0.25 -0.2 33.9 -0.25 -0.2
  [4,16,32.2,-0.25,0.8,30,-0.25,0.8,32.3,-0.25,-0.2,33.9,-0.25,-0.2],
// 4 16 32.3 -0.25 -1.2 32.3 -0.25 -0.2 30 -0.25 -2.2 32.2 -0.25 -2.2
  [4,16,32.3,-0.25,-1.2,32.3,-0.25,-0.2,30,-0.25,-2.2,32.2,-0.25,-2.2],
// 4 16 34.36194 -0.25 0.10866 34.4 -0.25 0.3 34.4 -0.25 1.1 34.36194 -0.25 1.29134
  [4,16,34.36194,-0.25,0.10866,34.4,-0.25,0.3,34.4,-0.25,1.1,34.36194,-0.25,1.29134],
// 4 16 34.25355 -0.25 -0.05355 34.36194 -0.25 0.10866 34.36194 -0.25 1.29134 34.25355 -0.25 1.45355
  [4,16,34.25355,-0.25,-0.05355,34.36194,-0.25,0.10866,34.36194,-0.25,1.29134,34.25355,-0.25,1.45355],
// 4 16 34.09134 -0.25 -0.16194 34.25355 -0.25 -0.05355 34.25355 -0.25 1.45355 34.09134 -0.25 1.56194
  [4,16,34.09134,-0.25,-0.16194,34.25355,-0.25,-0.05355,34.25355,-0.25,1.45355,34.09134,-0.25,1.56194],
// 4 16 33.9 -0.25 -0.2 34.09134 -0.25 -0.16194 34.09134 -0.25 1.56194 33.9 -0.25 1.6
  [4,16,33.9,-0.25,-0.2,34.09134,-0.25,-0.16194,34.09134,-0.25,1.56194,33.9,-0.25,1.6],
// 4 16 33.9 -0.25 -0.2 33.9 -0.25 1.6 32.7 -0.25 1.6 32.50866 -0.25 1.56194
  [4,16,33.9,-0.25,-0.2,33.9,-0.25,1.6,32.7,-0.25,1.6,32.50866,-0.25,1.56194],
// 4 16 33.9 -0.25 -0.2 32.50866 -0.25 1.56194 32.34645 -0.25 1.45355 32.23806 -0.25 1.29134
  [4,16,33.9,-0.25,-0.2,32.50866,-0.25,1.56194,32.34645,-0.25,1.45355,32.23806,-0.25,1.29134],
// 4 16 33.9 -0.25 -0.2 32.23806 -0.25 1.29134 32.2 -0.25 1.1 32.2 -0.25 0.8
  [4,16,33.9,-0.25,-0.2,32.23806,-0.25,1.29134,32.2,-0.25,1.1,32.2,-0.25,0.8],
// 4 16 32.7 -0.25 -3.9 33.9 -0.25 -3.9 34.09134 -0.25 -3.86194 32.50866 -0.25 -3.86194
  [4,16,32.7,-0.25,-3.9,33.9,-0.25,-3.9,34.09134,-0.25,-3.86194,32.50866,-0.25,-3.86194],
// 4 16 32.50866 -0.25 -3.86194 34.09134 -0.25 -3.86194 34.25355 -0.25 -3.75355 32.34645 -0.25 -3.75355
  [4,16,32.50866,-0.25,-3.86194,34.09134,-0.25,-3.86194,34.25355,-0.25,-3.75355,32.34645,-0.25,-3.75355],
// 4 16 32.34645 -0.25 -3.75355 34.25355 -0.25 -3.75355 34.36194 -0.25 -3.59134 32.23806 -0.25 -3.59134
  [4,16,32.34645,-0.25,-3.75355,34.25355,-0.25,-3.75355,34.36194,-0.25,-3.59134,32.23806,-0.25,-3.59134],
// 4 16 32.23806 -0.25 -3.59134 34.36194 -0.25 -3.59134 34.4 -0.25 -3.4 32.2 -0.25 -3.4
  [4,16,32.23806,-0.25,-3.59134,34.36194,-0.25,-3.59134,34.4,-0.25,-3.4,32.2,-0.25,-3.4],
// 4 16 32.2 -0.25 -3.4 34.4 -0.25 -1.7 34.36194 -0.25 -1.50866 34.25355 -0.25 -1.34645
  [4,16,32.2,-0.25,-3.4,34.4,-0.25,-1.7,34.36194,-0.25,-1.50866,34.25355,-0.25,-1.34645],
// 4 16 32.2 -0.25 -3.4 34.25355 -0.25 -1.34645 34.09134 -0.25 -1.23806 33.9 -0.25 -1.2
  [4,16,32.2,-0.25,-3.4,34.25355,-0.25,-1.34645,34.09134,-0.25,-1.23806,33.9,-0.25,-1.2],
// 4 16 32.2 -0.25 -2.2 32.2 -0.25 -3.4 33.9 -0.25 -1.2 32.3 -0.25 -1.2
  [4,16,32.2,-0.25,-2.2,32.2,-0.25,-3.4,33.9,-0.25,-1.2,32.3,-0.25,-1.2],
// 3 16 55 -0.25 7 52 -0.25 7 53.5 -0.25 2
  [3,16,55,-0.25,7,52,-0.25,7,53.5,-0.25,2],
// 3 16 50 -0.25 3 50 -0.25 -5 52 -0.25 -5
  [3,16,50,-0.25,3,50,-0.25,-5,52,-0.25,-5],
// 3 16 57 -0.25 3 55 -0.25 -5 57 -0.25 -5
  [3,16,57,-0.25,3,55,-0.25,-5,57,-0.25,-5],
// 4 16 66 -0.25 -3 75 -0.25 10 61 -0.25 7 63 -0.25 -3
  [4,16,66,-0.25,-3,75,-0.25,10,61,-0.25,7,63,-0.25,-3],
// 4 16 63 -0.25 -3 61 -0.25 7 61 -0.25 -5 63 -0.25 -5
  [4,16,63,-0.25,-3,61,-0.25,7,61,-0.25,-5,63,-0.25,-5],
// 4 16 75 -0.25 -10 75 -0.25 10 66 -0.25 -3 66 -0.25 -5
  [4,16,75,-0.25,-10,75,-0.25,10,66,-0.25,-3,66,-0.25,-5],
// 4 16 -65 -0.25 -5 -65 -0.25 7 -75 -0.25 10 -75 -0.25 -10
  [4,16,-65,-0.25,-5,-65,-0.25,7,-75,-0.25,10,-75,-0.25,-10],
// 4 16 6 -0.25 7 75 -0.25 10 -75 -0.25 10 -3 -0.25 7
  [4,16,6,-0.25,7,75,-0.25,10,-75,-0.25,10,-3,-0.25,7],
// 3 16 -75 -0.25 10 -6 -0.25 7 -3 -0.25 7
  [3,16,-75,-0.25,10,-6,-0.25,7,-3,-0.25,7],
// 3 16 -75 -0.25 10 -23 -0.25 7 -6 -0.25 7
  [3,16,-75,-0.25,10,-23,-0.25,7,-6,-0.25,7],
// 3 16 -75 -0.25 10 -27 -0.25 7 -23 -0.25 7
  [3,16,-75,-0.25,10,-27,-0.25,7,-23,-0.25,7],
// 3 16 -75 -0.25 10 -30 -0.25 7 -27 -0.25 7
  [3,16,-75,-0.25,10,-30,-0.25,7,-27,-0.25,7],
// 3 16 -75 -0.25 10 -34 -0.25 7 -30 -0.25 7
  [3,16,-75,-0.25,10,-34,-0.25,7,-30,-0.25,7],
// 3 16 -75 -0.25 10 -38.5 -0.25 7 -34 -0.25 7
  [3,16,-75,-0.25,10,-38.5,-0.25,7,-34,-0.25,7],
// 3 16 -75 -0.25 10 -45.5 -0.25 7 -38.5 -0.25 7
  [3,16,-75,-0.25,10,-45.5,-0.25,7,-38.5,-0.25,7],
// 3 16 -75 -0.25 10 -50 -0.25 7 -45.5 -0.25 7
  [3,16,-75,-0.25,10,-50,-0.25,7,-45.5,-0.25,7],
// 3 16 -75 -0.25 10 -56 -0.25 7 -50 -0.25 7
  [3,16,-75,-0.25,10,-56,-0.25,7,-50,-0.25,7],
// 3 16 -75 -0.25 10 -59 -0.25 7 -56 -0.25 7
  [3,16,-75,-0.25,10,-59,-0.25,7,-56,-0.25,7],
// 3 16 -75 -0.25 10 -65 -0.25 7 -59 -0.25 7
  [3,16,-75,-0.25,10,-65,-0.25,7,-59,-0.25,7],
// 3 16 75 -0.25 10 6 -0.25 7 9 -0.25 7
  [3,16,75,-0.25,10,6,-0.25,7,9,-0.25,7],
// 3 16 75 -0.25 10 9 -0.25 7 19 -0.25 7
  [3,16,75,-0.25,10,9,-0.25,7,19,-0.25,7],
// 3 16 75 -0.25 10 19 -0.25 7 21 -0.25 7
  [3,16,75,-0.25,10,19,-0.25,7,21,-0.25,7],
// 3 16 75 -0.25 10 21 -0.25 7 28 -0.25 7
  [3,16,75,-0.25,10,21,-0.25,7,28,-0.25,7],
// 3 16 75 -0.25 10 28 -0.25 7 31 -0.25 7
  [3,16,75,-0.25,10,28,-0.25,7,31,-0.25,7],
// 3 16 75 -0.25 10 31 -0.25 7 46 -0.25 7
  [3,16,75,-0.25,10,31,-0.25,7,46,-0.25,7],
// 3 16 75 -0.25 10 46 -0.25 7 52 -0.25 7
  [3,16,75,-0.25,10,46,-0.25,7,52,-0.25,7],
// 3 16 75 -0.25 10 52 -0.25 7 55 -0.25 7
  [3,16,75,-0.25,10,52,-0.25,7,55,-0.25,7],
// 3 16 75 -0.25 10 55 -0.25 7 61 -0.25 7
  [3,16,75,-0.25,10,55,-0.25,7,61,-0.25,7],
// 4 16 -75 -0.25 -10 75 -0.25 -10 4 -0.25 -5 -3 -0.25 -5
  [4,16,-75,-0.25,-10,75,-0.25,-10,4,-0.25,-5,-3,-0.25,-5],
// 3 16 -3 -0.25 -5 -8 -0.25 -5 -75 -0.25 -10
  [3,16,-3,-0.25,-5,-8,-0.25,-5,-75,-0.25,-10],
// 3 16 -8 -0.25 -5 -18 -0.25 -5 -75 -0.25 -10
  [3,16,-8,-0.25,-5,-18,-0.25,-5,-75,-0.25,-10],
// 3 16 -18 -0.25 -5 -21 -0.25 -5 -75 -0.25 -10
  [3,16,-18,-0.25,-5,-21,-0.25,-5,-75,-0.25,-10],
// 3 16 -21 -0.25 -5 -23 -0.25 -5 -75 -0.25 -10
  [3,16,-21,-0.25,-5,-23,-0.25,-5,-75,-0.25,-10],
// 3 16 -23 -0.25 -5 -27 -0.25 -5 -75 -0.25 -10
  [3,16,-23,-0.25,-5,-27,-0.25,-5,-75,-0.25,-10],
// 3 16 -27 -0.25 -5 -30 -0.25 -5 -75 -0.25 -10
  [3,16,-27,-0.25,-5,-30,-0.25,-5,-75,-0.25,-10],
// 3 16 -30 -0.25 -5 -34 -0.25 -5 -75 -0.25 -10
  [3,16,-30,-0.25,-5,-34,-0.25,-5,-75,-0.25,-10],
// 3 16 -34 -0.25 -5 -36 -0.25 -5 -75 -0.25 -10
  [3,16,-34,-0.25,-5,-36,-0.25,-5,-75,-0.25,-10],
// 3 16 -36 -0.25 -5 -40 -0.25 -5 -75 -0.25 -10
  [3,16,-36,-0.25,-5,-40,-0.25,-5,-75,-0.25,-10],
// 3 16 -40 -0.25 -5 -44 -0.25 -5 -75 -0.25 -10
  [3,16,-40,-0.25,-5,-44,-0.25,-5,-75,-0.25,-10],
// 3 16 -44 -0.25 -5 -48 -0.25 -5 -75 -0.25 -10
  [3,16,-44,-0.25,-5,-48,-0.25,-5,-75,-0.25,-10],
// 3 16 -48 -0.25 -5 -50 -0.25 -5 -75 -0.25 -10
  [3,16,-48,-0.25,-5,-50,-0.25,-5,-75,-0.25,-10],
// 3 16 -50 -0.25 -5 -54 -0.25 -5 -75 -0.25 -10
  [3,16,-50,-0.25,-5,-54,-0.25,-5,-75,-0.25,-10],
// 3 16 -54 -0.25 -5 -56 -0.25 -5 -75 -0.25 -10
  [3,16,-54,-0.25,-5,-56,-0.25,-5,-75,-0.25,-10],
// 3 16 -56 -0.25 -5 -59 -0.25 -5 -75 -0.25 -10
  [3,16,-56,-0.25,-5,-59,-0.25,-5,-75,-0.25,-10],
// 3 16 -59 -0.25 -5 -61 -0.25 -5 -75 -0.25 -10
  [3,16,-59,-0.25,-5,-61,-0.25,-5,-75,-0.25,-10],
// 3 16 -61 -0.25 -5 -65 -0.25 -5 -75 -0.25 -10
  [3,16,-61,-0.25,-5,-65,-0.25,-5,-75,-0.25,-10],
// 3 16 9 -0.25 -5 4 -0.25 -5 75 -0.25 -10
  [3,16,9,-0.25,-5,4,-0.25,-5,75,-0.25,-10],
// 3 16 20 -0.25 -5 9 -0.25 -5 75 -0.25 -10
  [3,16,20,-0.25,-5,9,-0.25,-5,75,-0.25,-10],
// 3 16 23 -0.25 -5 20 -0.25 -5 75 -0.25 -10
  [3,16,23,-0.25,-5,20,-0.25,-5,75,-0.25,-10],
// 3 16 50 -0.25 -5 46 -0.25 -5 75 -0.25 -10
  [3,16,50,-0.25,-5,46,-0.25,-5,75,-0.25,-10],
// 3 16 52 -0.25 -5 50 -0.25 -5 75 -0.25 -10
  [3,16,52,-0.25,-5,50,-0.25,-5,75,-0.25,-10],
// 3 16 55 -0.25 -5 52 -0.25 -5 75 -0.25 -10
  [3,16,55,-0.25,-5,52,-0.25,-5,75,-0.25,-10],
// 3 16 57 -0.25 -5 55 -0.25 -5 75 -0.25 -10
  [3,16,57,-0.25,-5,55,-0.25,-5,75,-0.25,-10],
// 3 16 61 -0.25 -5 57 -0.25 -5 75 -0.25 -10
  [3,16,61,-0.25,-5,57,-0.25,-5,75,-0.25,-10],
// 3 16 63 -0.25 -5 61 -0.25 -5 75 -0.25 -10
  [3,16,63,-0.25,-5,61,-0.25,-5,75,-0.25,-10],
// 3 16 66 -0.25 -5 63 -0.25 -5 75 -0.25 -10
  [3,16,66,-0.25,-5,63,-0.25,-5,75,-0.25,-10],
// 4 0 37 -0.25 -2.2 36.73358 -0.25 -1.43463 34.4 -0.25 -1.7 34.4 -0.25 -3.4
  [4,0,37,-0.25,-2.2,36.73358,-0.25,-1.43463,34.4,-0.25,-1.7,34.4,-0.25,-3.4],
// 3 0 37 -0.25 -2.2 34.4 -0.25 -3.4 37 -0.25 -3
  [3,0,37,-0.25,-2.2,34.4,-0.25,-3.4,37,-0.25,-3],
// 3 0 32.2 -0.25 -3.4 31.02513 -0.25 -4.41421 32.23806 -0.25 -3.59134
  [3,0,32.2,-0.25,-3.4,31.02513,-0.25,-4.41421,32.23806,-0.25,-3.59134],
// 3 16 34.4 -0.25 -1.7 32.2 -0.25 -3.4 34.4 -0.25 -3.4
  [3,16,34.4,-0.25,-1.7,32.2,-0.25,-3.4,34.4,-0.25,-3.4],
];
module ldraw_lib__4198678a(step=0, col=false, unit=2/5, alt=false, line=0.2, solid=!$preview)
    makepoly(ldraw_lib__4198678a(), step=step, col=col, unit=unit, alt=alt, line=line, solid=solid);
ldraw_lib__4198678a(line=0.2);
